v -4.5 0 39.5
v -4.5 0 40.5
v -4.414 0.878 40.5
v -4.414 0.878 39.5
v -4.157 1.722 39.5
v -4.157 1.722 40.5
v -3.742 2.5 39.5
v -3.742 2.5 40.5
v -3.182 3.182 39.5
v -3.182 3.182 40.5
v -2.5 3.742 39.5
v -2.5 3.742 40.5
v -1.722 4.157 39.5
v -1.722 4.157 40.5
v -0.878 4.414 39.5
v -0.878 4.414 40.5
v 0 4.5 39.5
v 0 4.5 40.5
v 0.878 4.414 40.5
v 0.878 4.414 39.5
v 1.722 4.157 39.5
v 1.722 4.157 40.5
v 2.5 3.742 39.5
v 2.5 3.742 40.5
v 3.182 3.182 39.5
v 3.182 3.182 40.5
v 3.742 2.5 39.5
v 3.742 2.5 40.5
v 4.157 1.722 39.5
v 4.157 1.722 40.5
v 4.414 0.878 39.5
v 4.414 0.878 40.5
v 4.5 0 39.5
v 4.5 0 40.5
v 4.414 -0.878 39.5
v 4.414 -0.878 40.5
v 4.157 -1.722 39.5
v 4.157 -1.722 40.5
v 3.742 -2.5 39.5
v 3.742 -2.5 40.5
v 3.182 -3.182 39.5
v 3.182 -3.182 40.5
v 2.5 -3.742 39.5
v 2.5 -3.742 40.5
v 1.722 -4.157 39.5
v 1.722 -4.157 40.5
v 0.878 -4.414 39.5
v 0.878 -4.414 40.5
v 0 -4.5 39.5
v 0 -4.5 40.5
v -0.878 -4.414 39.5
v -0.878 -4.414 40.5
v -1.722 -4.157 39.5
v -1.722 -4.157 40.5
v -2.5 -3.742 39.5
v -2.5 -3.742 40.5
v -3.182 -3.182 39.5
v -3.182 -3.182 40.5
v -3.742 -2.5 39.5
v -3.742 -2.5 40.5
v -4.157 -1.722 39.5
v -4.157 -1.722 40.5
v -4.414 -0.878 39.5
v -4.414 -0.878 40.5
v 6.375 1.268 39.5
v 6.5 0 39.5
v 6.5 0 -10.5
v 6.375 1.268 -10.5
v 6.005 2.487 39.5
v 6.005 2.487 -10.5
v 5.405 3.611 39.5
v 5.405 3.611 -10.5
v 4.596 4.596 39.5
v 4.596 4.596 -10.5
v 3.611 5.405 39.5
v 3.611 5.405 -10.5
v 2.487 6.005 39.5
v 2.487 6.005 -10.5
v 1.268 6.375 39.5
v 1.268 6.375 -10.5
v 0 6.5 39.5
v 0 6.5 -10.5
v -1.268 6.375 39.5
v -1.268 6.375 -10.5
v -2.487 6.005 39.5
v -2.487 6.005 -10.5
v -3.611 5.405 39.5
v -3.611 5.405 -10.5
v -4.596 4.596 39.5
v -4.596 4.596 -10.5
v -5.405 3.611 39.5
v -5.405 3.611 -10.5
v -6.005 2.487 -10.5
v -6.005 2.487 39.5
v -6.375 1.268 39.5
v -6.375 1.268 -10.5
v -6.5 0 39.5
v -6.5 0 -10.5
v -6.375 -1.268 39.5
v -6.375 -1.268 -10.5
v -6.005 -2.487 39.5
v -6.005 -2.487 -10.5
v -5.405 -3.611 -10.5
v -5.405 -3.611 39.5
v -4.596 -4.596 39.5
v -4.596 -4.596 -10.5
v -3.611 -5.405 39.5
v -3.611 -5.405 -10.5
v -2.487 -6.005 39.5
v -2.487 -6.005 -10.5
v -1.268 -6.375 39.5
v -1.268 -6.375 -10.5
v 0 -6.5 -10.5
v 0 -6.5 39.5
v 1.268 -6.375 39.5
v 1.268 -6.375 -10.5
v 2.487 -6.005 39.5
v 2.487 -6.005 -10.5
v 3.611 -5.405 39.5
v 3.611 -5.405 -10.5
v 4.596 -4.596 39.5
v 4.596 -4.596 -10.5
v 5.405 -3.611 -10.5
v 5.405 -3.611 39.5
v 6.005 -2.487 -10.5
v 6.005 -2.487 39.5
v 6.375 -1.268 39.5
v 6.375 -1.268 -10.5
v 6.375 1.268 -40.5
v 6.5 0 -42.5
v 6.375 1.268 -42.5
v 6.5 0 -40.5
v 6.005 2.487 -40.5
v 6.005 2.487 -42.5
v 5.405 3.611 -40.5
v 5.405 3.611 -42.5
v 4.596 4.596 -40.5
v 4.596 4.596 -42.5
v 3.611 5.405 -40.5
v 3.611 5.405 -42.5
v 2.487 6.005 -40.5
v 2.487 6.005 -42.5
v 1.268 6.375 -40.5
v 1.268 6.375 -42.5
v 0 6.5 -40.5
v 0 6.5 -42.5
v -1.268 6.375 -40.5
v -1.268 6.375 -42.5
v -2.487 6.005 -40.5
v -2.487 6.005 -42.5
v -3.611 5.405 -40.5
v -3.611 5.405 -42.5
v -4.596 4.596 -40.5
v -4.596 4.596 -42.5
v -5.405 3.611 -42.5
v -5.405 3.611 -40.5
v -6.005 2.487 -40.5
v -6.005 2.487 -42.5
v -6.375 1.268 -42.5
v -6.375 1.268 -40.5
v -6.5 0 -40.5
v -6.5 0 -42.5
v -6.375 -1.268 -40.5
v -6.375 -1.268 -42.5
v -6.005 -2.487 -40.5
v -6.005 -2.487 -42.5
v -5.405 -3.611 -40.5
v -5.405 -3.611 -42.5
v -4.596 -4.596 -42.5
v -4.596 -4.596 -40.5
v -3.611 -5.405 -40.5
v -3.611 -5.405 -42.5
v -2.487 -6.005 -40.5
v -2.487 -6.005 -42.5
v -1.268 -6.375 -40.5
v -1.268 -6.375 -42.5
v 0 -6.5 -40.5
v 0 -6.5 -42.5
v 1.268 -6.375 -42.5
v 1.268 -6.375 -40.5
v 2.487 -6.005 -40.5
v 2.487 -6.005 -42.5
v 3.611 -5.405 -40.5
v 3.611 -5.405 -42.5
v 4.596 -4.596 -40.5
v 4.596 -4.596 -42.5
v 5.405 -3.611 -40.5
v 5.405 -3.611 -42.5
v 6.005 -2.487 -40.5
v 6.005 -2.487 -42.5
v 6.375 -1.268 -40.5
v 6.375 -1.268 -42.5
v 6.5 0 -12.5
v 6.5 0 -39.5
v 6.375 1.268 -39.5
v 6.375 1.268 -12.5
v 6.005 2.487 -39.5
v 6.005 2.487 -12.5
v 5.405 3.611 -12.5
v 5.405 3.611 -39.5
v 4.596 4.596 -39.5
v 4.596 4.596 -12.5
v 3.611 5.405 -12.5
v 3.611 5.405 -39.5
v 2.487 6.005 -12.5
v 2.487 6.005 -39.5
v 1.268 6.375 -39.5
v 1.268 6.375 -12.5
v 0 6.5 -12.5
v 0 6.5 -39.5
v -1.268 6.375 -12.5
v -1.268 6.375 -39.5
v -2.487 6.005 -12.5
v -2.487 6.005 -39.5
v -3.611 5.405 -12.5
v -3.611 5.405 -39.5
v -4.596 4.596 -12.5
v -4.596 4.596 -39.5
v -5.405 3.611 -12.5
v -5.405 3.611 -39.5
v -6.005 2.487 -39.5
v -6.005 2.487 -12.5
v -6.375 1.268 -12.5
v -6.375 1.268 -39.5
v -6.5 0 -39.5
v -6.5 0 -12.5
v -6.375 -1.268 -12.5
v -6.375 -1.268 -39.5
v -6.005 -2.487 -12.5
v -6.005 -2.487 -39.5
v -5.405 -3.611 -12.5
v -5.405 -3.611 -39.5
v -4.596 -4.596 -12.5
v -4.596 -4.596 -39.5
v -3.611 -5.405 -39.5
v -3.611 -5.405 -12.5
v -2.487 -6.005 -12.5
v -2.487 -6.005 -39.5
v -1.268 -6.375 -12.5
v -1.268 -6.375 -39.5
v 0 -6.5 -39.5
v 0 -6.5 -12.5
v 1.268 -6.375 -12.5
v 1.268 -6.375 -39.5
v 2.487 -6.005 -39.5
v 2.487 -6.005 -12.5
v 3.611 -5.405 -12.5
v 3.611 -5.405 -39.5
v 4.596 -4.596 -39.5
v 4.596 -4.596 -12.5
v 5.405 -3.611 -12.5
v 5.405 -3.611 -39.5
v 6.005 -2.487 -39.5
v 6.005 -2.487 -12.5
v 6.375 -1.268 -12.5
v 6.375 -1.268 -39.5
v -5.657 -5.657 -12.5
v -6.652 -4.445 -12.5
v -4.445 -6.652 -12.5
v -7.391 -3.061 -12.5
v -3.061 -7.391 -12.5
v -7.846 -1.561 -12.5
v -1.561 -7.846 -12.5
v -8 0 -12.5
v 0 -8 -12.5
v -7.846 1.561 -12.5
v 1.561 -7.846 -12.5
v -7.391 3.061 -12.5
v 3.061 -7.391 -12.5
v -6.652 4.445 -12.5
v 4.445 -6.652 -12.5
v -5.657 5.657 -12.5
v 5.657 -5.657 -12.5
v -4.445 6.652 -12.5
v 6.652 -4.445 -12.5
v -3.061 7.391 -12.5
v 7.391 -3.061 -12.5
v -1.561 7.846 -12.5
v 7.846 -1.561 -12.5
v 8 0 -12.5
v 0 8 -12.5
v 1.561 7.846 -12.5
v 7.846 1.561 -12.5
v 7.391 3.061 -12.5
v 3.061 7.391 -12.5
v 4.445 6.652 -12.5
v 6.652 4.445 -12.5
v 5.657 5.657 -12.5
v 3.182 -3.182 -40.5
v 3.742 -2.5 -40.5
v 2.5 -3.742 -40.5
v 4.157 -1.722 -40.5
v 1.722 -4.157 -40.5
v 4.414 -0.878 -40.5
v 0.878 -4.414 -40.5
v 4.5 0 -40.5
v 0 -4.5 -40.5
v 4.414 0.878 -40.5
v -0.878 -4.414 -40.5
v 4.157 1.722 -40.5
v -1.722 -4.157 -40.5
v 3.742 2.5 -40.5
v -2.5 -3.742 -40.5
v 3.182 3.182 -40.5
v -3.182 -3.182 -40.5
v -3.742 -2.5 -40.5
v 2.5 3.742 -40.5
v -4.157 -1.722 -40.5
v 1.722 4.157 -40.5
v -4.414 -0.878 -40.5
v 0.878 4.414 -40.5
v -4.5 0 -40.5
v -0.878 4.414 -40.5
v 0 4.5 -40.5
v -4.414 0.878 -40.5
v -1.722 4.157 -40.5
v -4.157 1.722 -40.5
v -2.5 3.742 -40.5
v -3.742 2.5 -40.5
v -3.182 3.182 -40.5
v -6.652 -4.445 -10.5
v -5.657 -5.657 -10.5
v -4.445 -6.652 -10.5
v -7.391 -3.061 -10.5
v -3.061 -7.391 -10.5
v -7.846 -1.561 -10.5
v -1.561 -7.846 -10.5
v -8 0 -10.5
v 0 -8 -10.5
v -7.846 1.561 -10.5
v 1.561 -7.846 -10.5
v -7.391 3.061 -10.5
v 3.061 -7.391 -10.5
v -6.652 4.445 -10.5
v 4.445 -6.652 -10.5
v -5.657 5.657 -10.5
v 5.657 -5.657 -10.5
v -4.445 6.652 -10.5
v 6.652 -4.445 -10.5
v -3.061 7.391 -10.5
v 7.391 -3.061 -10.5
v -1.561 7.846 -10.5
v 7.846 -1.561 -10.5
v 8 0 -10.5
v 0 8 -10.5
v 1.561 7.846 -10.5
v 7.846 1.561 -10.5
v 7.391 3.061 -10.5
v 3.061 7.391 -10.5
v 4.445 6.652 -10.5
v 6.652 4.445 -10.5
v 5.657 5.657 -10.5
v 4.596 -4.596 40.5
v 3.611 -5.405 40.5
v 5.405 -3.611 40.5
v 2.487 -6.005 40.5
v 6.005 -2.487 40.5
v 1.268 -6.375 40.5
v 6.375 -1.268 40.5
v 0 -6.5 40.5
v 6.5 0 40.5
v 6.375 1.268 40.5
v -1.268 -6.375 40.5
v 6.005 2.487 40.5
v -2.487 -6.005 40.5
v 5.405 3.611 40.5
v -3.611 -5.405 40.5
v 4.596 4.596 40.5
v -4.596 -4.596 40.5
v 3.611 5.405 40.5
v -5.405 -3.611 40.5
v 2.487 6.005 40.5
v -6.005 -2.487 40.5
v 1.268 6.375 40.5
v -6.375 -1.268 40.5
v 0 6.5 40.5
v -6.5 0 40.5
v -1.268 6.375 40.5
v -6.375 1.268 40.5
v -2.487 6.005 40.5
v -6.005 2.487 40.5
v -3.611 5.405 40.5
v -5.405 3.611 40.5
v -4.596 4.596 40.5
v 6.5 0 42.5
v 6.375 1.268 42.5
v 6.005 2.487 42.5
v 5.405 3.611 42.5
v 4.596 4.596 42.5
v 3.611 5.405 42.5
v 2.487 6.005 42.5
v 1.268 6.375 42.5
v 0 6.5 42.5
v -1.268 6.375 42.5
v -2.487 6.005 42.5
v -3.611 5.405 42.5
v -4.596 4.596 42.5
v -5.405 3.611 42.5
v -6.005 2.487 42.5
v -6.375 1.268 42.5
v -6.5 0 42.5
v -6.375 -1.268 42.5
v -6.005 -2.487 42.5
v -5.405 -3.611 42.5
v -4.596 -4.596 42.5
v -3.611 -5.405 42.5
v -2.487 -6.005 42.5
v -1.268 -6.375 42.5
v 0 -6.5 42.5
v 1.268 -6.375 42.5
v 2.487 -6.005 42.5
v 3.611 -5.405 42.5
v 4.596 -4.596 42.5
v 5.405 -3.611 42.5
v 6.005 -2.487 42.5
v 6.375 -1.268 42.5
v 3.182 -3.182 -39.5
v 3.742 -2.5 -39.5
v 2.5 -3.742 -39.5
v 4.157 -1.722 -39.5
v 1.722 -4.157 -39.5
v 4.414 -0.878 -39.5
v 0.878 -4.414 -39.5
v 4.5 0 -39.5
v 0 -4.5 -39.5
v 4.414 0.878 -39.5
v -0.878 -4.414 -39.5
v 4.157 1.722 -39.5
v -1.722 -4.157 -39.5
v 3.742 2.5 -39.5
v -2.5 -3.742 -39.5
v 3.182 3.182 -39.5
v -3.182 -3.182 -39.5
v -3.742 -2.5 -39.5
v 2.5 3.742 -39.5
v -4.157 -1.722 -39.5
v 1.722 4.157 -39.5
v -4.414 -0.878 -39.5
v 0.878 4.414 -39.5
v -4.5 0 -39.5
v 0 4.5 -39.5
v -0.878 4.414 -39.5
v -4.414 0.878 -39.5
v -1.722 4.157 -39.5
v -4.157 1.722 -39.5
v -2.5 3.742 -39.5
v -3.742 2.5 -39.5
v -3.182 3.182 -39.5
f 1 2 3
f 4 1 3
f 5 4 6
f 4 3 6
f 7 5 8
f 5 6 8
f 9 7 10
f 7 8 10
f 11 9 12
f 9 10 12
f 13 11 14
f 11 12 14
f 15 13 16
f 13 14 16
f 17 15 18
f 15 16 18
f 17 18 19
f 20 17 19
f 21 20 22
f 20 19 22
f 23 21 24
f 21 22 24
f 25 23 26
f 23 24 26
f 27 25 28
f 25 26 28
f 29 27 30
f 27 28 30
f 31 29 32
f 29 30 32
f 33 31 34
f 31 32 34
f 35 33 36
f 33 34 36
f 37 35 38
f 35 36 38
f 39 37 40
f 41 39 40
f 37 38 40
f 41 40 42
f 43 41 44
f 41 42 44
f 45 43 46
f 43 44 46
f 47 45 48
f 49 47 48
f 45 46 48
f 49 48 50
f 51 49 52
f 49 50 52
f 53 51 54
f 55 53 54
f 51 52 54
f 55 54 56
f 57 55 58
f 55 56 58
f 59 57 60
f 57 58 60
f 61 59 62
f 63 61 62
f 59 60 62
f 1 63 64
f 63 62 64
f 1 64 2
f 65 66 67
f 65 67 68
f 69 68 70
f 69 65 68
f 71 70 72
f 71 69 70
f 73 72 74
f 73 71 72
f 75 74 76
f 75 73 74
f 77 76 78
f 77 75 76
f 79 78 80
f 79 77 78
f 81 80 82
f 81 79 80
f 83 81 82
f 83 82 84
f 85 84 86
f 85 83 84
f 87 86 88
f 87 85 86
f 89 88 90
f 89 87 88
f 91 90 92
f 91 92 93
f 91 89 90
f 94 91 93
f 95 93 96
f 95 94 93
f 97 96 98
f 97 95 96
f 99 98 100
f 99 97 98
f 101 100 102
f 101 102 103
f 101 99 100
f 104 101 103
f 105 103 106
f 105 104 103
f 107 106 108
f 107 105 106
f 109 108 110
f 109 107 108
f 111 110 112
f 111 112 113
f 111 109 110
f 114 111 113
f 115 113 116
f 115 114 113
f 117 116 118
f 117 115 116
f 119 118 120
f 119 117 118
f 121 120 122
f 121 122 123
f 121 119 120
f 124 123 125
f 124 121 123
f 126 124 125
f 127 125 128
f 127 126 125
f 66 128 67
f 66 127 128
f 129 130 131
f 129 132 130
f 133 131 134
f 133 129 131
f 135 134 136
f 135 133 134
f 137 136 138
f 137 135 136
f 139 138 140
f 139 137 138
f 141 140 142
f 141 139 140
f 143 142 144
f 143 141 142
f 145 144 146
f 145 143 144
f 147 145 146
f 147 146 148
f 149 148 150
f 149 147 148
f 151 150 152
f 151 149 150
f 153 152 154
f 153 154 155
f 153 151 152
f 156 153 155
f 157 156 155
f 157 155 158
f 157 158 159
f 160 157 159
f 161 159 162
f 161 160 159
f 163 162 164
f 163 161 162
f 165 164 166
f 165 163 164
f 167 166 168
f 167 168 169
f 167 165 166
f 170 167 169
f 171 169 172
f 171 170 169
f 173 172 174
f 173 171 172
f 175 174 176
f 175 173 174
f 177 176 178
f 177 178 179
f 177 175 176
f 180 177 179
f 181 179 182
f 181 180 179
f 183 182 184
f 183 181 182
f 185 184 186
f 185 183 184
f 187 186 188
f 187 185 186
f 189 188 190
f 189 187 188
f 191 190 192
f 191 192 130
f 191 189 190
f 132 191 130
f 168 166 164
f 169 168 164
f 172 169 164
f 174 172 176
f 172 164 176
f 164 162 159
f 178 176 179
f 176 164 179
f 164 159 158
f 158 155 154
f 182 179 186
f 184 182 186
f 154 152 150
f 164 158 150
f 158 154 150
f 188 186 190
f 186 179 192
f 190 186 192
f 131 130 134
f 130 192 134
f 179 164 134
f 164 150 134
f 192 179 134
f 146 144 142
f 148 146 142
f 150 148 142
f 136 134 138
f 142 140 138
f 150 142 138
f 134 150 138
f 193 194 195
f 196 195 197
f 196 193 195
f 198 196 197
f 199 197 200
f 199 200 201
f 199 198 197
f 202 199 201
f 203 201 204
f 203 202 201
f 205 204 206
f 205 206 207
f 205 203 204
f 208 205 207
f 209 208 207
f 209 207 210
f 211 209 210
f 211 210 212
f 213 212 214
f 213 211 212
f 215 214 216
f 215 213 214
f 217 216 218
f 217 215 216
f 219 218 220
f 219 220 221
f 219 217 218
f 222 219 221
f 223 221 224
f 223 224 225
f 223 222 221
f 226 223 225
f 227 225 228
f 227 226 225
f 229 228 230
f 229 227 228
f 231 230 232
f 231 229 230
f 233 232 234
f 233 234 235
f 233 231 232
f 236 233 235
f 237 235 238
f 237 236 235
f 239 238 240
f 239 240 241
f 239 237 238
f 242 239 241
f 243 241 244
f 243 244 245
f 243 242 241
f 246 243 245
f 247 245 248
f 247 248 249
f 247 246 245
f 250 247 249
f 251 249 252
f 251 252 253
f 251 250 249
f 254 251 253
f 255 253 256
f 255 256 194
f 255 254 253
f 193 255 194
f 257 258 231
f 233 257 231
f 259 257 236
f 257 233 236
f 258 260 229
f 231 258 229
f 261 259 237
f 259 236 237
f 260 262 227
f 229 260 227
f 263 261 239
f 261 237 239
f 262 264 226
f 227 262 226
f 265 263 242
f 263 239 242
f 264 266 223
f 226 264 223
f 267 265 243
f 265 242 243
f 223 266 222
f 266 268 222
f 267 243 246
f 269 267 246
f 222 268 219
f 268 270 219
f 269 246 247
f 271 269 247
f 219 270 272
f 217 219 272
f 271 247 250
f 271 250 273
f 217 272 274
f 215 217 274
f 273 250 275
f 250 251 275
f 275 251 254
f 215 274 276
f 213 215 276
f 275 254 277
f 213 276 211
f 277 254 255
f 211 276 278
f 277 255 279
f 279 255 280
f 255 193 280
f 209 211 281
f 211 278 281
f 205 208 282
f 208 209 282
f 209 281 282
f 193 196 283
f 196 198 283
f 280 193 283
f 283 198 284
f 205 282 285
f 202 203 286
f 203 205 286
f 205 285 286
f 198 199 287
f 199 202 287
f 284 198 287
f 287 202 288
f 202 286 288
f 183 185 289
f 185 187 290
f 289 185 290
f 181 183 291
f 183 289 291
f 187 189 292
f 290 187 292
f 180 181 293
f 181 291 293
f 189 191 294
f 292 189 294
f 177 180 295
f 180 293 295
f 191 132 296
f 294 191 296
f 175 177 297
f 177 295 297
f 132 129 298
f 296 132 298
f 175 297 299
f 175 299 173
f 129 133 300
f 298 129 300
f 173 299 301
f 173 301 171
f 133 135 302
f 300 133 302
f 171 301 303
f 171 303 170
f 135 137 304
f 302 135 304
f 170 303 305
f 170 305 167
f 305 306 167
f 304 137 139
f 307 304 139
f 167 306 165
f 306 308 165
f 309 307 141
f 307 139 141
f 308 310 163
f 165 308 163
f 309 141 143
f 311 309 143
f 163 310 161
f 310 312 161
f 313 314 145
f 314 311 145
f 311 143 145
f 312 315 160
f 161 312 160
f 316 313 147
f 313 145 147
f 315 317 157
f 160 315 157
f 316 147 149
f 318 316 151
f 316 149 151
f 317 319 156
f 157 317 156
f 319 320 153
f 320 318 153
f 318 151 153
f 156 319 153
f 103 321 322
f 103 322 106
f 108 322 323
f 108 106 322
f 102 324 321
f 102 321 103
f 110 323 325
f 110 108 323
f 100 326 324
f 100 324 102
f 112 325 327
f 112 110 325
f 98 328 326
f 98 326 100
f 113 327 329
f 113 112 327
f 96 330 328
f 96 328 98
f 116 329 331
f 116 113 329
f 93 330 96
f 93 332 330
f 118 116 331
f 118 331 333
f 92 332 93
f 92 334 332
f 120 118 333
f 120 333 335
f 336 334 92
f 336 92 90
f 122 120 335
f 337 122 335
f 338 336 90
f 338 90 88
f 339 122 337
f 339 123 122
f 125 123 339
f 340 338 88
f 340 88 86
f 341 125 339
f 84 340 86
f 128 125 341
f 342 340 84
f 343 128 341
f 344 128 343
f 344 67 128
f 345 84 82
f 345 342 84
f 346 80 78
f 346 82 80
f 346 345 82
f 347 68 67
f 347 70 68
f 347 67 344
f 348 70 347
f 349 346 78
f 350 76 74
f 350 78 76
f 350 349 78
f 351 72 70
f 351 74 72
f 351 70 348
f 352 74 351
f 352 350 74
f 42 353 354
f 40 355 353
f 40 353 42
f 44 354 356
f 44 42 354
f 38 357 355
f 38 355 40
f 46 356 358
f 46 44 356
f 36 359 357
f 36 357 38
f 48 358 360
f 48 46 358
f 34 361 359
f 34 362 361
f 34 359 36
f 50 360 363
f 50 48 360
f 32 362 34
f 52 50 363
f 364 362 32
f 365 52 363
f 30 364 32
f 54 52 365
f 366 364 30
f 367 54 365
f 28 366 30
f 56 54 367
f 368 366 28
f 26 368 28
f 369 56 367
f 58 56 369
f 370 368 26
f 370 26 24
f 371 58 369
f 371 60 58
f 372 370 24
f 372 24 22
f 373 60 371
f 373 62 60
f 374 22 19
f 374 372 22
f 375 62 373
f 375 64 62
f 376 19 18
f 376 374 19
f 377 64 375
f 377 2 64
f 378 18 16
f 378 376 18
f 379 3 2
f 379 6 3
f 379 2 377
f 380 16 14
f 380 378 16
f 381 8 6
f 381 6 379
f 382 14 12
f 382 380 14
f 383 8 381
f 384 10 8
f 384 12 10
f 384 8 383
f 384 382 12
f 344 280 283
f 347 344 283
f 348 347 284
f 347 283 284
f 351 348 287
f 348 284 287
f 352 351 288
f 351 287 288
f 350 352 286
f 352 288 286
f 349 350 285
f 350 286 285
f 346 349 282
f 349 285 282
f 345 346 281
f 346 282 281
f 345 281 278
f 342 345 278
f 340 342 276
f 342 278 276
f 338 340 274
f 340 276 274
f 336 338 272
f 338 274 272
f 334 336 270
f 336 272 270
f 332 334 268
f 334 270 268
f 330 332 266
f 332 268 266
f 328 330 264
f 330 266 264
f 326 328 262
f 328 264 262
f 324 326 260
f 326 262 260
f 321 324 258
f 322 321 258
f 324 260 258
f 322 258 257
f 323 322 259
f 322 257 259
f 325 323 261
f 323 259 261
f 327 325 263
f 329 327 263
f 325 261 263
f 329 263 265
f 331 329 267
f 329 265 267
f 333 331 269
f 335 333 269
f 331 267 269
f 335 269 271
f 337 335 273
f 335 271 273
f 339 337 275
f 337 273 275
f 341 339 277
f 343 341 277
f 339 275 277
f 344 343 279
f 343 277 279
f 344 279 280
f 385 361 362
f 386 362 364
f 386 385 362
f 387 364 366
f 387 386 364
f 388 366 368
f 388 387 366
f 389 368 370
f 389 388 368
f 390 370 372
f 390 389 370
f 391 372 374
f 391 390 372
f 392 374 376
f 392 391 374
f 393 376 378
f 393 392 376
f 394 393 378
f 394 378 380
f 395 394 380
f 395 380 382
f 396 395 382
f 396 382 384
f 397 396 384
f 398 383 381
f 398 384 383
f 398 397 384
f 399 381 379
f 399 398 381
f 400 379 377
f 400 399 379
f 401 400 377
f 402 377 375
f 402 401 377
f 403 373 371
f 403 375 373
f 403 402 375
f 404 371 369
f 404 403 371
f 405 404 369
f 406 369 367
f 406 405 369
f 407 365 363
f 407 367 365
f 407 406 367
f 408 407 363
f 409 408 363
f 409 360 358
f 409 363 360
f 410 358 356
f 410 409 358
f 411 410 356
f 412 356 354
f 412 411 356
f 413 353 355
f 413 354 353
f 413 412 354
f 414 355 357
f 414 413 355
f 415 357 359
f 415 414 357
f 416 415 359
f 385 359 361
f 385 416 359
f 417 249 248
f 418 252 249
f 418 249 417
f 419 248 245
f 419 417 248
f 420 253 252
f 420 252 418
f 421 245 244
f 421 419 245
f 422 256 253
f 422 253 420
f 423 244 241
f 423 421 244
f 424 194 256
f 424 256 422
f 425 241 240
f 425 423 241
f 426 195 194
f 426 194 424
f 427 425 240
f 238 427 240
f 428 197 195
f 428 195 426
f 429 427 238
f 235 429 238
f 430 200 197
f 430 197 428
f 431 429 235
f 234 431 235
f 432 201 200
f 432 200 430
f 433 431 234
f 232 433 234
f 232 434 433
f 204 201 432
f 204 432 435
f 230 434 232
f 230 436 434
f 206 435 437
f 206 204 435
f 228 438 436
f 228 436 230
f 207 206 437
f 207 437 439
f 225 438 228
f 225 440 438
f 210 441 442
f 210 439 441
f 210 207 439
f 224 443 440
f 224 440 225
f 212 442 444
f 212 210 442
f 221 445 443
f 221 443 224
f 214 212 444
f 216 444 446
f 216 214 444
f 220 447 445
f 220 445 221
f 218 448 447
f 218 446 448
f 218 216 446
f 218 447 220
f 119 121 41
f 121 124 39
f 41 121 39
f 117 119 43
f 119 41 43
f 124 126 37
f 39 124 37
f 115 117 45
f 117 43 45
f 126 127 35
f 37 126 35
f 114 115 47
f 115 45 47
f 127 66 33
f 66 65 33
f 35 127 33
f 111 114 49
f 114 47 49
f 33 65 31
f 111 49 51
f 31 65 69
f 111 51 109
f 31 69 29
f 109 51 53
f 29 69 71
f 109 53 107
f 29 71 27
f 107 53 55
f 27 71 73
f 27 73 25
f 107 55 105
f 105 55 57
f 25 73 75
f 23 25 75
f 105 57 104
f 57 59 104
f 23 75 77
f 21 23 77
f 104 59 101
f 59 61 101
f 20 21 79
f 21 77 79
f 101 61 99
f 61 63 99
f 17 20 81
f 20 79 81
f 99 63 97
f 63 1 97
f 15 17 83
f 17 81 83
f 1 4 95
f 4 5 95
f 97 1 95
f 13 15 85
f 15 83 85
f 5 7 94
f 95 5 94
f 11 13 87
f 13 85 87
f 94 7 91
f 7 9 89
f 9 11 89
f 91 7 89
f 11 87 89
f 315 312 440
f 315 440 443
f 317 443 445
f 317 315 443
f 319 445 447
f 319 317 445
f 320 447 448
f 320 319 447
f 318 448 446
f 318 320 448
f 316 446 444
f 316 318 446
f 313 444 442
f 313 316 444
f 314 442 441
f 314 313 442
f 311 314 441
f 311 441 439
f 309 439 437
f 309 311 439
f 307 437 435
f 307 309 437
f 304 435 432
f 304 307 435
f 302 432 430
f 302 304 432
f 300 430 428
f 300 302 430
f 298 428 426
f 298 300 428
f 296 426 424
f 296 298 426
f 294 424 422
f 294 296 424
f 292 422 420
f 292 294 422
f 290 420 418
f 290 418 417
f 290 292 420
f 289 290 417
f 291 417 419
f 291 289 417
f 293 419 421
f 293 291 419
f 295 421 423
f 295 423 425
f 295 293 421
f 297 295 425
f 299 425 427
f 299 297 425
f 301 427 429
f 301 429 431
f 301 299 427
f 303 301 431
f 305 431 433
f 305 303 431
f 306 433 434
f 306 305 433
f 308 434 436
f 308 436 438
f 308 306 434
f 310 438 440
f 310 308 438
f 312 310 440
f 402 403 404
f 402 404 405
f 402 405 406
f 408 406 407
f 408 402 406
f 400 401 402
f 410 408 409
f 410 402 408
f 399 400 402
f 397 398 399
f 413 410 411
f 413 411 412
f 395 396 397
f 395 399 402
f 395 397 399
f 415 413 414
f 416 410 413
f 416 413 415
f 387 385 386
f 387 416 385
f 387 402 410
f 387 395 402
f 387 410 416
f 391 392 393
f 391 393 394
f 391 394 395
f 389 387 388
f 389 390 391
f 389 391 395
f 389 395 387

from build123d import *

# Parameters (mm, degrees)
SKETCH1_R           = 6.5
BOSS_EXTRUDE1_DEPTH = 42.5
SKETCH2_R           = 8
BOSS_EXTRUDE2_DEPTH = 2
SKETCH3_R           = 6.5
SKETCH3_R_2         = 4.5
CUT_EXTRUDE1_DEPTH  = 1


with BuildPart() as part:
    # Sketch1 → Boss-Extrude1 (new body, symmetric)
    with BuildSketch(Plane.XY):
        Circle(SKETCH1_R)
    extrude(amount=BOSS_EXTRUDE1_DEPTH, both=True)

    # Sketch2 → Boss-Extrude2 (add)
    with BuildSketch(Plane.XY.offset(-12.5)):
        Circle(SKETCH2_R)
    extrude(amount=BOSS_EXTRUDE2_DEPTH)

    # Sketch3 → Cut-Extrude1 (cut)
    with BuildSketch(Plane(origin=(0, 0, -40.5), x_dir=(-1, 0, 0), z_dir=(0, 0, -1))):
        Circle(SKETCH3_R)
        Circle(SKETCH3_R_2, mode=Mode.SUBTRACT)
    cut_extrude1 = extrude(amount=-CUT_EXTRUDE1_DEPTH, mode=Mode.SUBTRACT)

    # Mirror1: Cut-Extrude1 across plane
    add(cut_extrude1.mirror(Plane.XY), mode=Mode.SUBTRACT)


solid = part.part
